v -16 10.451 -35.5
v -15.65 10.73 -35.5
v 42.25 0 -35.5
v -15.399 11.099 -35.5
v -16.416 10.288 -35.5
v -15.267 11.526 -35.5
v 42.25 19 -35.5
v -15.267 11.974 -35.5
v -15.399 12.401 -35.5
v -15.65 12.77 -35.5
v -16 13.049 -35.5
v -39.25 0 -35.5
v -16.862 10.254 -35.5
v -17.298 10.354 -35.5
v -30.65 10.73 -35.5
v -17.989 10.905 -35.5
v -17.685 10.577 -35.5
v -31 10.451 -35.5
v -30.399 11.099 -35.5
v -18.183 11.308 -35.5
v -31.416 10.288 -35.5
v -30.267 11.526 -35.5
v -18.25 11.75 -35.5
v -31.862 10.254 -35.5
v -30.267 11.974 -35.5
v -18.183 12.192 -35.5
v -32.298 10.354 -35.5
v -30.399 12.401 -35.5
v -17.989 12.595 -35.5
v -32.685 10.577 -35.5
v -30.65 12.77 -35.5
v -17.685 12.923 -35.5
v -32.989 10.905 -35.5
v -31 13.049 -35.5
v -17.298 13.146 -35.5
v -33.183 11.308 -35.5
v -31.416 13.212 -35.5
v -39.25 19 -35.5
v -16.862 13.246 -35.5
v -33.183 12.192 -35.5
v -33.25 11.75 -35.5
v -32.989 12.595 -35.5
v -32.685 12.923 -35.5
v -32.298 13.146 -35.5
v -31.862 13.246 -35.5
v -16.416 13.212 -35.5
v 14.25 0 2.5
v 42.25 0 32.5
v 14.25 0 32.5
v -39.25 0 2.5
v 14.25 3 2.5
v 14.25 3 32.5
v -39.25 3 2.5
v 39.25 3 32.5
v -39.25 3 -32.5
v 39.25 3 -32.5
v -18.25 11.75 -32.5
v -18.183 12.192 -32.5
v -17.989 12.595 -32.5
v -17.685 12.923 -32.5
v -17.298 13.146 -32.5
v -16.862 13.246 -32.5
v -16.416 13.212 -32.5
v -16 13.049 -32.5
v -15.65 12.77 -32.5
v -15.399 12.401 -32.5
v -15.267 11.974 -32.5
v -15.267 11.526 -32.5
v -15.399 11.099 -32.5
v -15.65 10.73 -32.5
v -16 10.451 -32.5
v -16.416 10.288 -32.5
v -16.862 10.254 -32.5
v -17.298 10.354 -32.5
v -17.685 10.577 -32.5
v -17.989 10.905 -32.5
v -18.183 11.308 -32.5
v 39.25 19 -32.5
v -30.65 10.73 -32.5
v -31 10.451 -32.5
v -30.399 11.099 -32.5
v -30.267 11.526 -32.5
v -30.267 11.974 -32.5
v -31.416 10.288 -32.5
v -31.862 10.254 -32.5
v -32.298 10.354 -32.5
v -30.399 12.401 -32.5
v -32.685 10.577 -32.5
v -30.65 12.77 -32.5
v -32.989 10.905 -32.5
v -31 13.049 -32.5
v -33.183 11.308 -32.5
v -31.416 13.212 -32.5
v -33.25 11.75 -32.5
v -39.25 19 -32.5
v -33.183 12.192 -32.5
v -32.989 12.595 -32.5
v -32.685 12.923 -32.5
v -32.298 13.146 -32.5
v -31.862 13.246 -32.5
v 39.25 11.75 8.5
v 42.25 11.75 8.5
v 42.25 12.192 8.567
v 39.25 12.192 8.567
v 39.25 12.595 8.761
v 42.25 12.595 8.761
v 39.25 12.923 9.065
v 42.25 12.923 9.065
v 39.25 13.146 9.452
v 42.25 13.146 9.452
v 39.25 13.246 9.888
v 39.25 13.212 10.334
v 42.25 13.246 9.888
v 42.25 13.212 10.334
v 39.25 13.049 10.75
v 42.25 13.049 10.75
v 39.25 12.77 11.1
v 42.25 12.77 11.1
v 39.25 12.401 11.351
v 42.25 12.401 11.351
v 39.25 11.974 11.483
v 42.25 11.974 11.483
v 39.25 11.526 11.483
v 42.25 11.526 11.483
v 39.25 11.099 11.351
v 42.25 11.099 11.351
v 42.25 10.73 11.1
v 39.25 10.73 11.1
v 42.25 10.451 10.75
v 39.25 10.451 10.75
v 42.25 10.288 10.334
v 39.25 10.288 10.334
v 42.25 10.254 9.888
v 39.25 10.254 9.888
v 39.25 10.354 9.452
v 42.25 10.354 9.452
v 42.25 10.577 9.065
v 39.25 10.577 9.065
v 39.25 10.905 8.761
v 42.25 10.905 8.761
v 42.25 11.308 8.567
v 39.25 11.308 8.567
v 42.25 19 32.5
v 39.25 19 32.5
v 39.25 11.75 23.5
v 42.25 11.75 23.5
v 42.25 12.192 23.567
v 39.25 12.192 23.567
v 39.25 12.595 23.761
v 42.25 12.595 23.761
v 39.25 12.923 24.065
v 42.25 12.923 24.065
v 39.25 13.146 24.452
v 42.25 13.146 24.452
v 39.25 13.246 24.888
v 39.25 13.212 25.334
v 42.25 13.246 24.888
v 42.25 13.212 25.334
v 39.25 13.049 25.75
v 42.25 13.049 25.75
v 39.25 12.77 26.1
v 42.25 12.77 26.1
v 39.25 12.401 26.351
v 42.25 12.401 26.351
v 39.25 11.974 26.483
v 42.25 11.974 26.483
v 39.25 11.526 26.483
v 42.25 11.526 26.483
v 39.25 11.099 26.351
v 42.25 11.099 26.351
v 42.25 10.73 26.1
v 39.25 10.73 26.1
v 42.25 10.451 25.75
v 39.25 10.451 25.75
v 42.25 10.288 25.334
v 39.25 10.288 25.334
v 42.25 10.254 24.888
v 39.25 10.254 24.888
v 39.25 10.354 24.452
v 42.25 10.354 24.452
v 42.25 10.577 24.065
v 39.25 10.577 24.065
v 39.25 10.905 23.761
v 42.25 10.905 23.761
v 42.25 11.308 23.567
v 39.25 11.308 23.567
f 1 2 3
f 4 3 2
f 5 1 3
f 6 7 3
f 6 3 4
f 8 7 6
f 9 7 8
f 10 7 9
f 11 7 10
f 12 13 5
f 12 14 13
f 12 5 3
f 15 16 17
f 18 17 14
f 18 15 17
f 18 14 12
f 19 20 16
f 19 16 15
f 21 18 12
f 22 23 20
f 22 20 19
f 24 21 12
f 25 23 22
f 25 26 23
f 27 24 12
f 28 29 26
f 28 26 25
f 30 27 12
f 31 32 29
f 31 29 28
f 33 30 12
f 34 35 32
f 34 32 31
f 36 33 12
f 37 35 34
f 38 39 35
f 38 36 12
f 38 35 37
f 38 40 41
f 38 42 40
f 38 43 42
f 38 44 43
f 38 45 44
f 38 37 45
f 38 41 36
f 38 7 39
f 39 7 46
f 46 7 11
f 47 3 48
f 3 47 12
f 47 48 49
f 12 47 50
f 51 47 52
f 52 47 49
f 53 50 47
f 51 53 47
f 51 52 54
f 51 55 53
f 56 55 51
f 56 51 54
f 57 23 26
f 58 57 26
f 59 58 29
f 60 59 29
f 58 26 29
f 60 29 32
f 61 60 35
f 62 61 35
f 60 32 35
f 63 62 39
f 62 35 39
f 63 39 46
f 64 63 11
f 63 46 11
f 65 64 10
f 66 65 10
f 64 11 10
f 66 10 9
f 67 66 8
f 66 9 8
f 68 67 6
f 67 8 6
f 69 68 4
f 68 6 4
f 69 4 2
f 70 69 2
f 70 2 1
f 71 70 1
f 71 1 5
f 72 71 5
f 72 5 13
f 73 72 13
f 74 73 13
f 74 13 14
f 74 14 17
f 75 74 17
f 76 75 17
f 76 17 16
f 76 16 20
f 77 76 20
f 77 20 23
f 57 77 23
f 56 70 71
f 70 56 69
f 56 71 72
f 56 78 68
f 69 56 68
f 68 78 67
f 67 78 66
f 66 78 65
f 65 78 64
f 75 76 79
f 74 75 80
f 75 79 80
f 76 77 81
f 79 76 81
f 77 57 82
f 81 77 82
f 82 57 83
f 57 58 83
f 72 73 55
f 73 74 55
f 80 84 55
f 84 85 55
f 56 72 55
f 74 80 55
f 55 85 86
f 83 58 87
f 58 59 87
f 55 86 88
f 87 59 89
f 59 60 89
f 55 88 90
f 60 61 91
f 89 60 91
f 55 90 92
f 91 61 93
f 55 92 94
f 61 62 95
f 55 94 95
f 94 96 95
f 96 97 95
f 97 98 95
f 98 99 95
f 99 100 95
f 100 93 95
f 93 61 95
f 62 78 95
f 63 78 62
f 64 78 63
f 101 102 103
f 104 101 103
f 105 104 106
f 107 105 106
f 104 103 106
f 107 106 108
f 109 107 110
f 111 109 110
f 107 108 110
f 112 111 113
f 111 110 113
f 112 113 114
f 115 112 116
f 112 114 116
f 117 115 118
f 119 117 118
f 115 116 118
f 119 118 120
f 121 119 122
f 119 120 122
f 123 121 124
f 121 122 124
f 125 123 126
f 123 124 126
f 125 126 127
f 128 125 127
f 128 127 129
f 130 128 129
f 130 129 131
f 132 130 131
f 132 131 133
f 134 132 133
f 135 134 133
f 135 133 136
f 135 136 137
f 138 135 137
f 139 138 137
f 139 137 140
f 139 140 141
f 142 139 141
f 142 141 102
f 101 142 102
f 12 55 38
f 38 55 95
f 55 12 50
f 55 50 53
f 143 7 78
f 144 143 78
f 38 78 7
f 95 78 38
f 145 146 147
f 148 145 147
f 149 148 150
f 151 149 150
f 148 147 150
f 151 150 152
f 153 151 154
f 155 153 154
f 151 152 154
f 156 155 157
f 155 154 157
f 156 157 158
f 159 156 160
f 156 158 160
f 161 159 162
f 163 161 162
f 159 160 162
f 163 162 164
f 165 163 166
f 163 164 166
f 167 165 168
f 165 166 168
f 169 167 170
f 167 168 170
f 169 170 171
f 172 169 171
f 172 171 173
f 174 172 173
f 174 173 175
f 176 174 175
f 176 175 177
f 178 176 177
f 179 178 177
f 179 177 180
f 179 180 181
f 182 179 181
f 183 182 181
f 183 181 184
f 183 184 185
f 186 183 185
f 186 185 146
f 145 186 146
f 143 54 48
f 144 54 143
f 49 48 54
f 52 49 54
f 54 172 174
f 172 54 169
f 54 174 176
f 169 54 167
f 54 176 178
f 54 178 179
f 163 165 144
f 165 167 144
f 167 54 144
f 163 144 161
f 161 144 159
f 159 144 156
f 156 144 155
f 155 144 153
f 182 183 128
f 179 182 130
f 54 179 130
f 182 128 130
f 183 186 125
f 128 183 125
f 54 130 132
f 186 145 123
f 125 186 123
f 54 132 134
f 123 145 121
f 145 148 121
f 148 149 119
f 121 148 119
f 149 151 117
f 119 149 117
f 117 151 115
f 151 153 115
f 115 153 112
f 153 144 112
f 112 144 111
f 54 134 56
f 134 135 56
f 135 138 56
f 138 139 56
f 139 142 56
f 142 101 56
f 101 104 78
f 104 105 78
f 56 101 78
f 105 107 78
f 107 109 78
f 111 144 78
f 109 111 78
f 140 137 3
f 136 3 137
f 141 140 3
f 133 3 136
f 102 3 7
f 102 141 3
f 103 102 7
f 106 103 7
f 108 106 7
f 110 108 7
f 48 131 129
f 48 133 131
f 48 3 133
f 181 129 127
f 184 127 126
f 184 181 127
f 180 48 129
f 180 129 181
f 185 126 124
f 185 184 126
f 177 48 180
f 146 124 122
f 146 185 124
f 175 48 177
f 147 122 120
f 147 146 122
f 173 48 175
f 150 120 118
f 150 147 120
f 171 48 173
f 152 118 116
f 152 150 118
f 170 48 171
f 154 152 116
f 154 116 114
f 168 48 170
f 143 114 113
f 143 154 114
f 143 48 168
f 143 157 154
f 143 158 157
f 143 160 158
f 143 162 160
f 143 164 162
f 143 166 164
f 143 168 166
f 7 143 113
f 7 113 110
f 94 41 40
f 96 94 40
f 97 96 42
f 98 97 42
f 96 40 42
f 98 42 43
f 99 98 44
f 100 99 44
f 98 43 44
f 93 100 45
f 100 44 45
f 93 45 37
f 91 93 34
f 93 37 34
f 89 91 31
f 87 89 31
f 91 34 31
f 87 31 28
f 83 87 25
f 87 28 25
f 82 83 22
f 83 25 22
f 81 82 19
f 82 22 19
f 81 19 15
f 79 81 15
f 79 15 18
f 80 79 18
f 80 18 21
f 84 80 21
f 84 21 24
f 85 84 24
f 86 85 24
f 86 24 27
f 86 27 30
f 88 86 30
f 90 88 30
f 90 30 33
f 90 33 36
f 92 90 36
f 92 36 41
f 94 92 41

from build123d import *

# Parameters (mm, degrees)
SALIENTE_EXTRUIR1_DEPTH = 3
CROQUIS2_W              = 65
CROQUIS2_H              = 19
SALIENTE_EXTRUIR2_DEPTH = 3
CROQUIS3_W              = 81.5
CROQUIS3_H              = 19
SALIENTE_EXTRUIR3_DEPTH = 3
CROQUIS4_R              = 1.5
CORTAR_EXTRUIR1_DEPTH   = 69
CROQUIS5_R              = 1.5
CORTAR_EXTRUIR2_DEPTH   = 82.5


with BuildPart() as part:
    # Croquis1 → Saliente-Extruir1 (new body)
    with BuildSketch(Plane(origin=(0, 0, 0), x_dir=(1, 0, 0), z_dir=(0, 1, 0))):
        Polygon((-39.25, -2.5), (14.25, -2.5), (14.25, -32.5), (39.25, -32.5), (39.25, 32.5), (-39.25, 32.5), align=None)
    extrude(amount=SALIENTE_EXTRUIR1_DEPTH)

    # Croquis2 → Saliente-Extruir2 (add)
    with BuildSketch(Plane(origin=(39.25, 0, 0), x_dir=(0, 0, -1), z_dir=(1, 0, 0))):
        with Locations((0, 9.5)):
            Rectangle(CROQUIS2_W, CROQUIS2_H)
    extrude(amount=SALIENTE_EXTRUIR2_DEPTH)

    # Croquis3 → Saliente-Extruir3 (add)
    with BuildSketch(Plane(origin=(0, 0, -32.5), x_dir=(-1, 0, 0), z_dir=(0, 0, -1))):
        with Locations((-1.5, 9.5)):
            Rectangle(CROQUIS3_W, CROQUIS3_H)
    extrude(amount=SALIENTE_EXTRUIR3_DEPTH)

    # Croquis4 → Cortar-Extruir1 (cut, through all)
    with BuildSketch(Plane(origin=(0, 0, -35.5), x_dir=(-1, 0, 0), z_dir=(0, 0, -1))):
        with Locations((31.75, 11.75)):
            Circle(CROQUIS4_R)
        with Locations((16.75, 11.75)):
            Circle(CROQUIS4_R)
    extrude(amount=-CORTAR_EXTRUIR1_DEPTH, mode=Mode.SUBTRACT)

    # Croquis5 → Cortar-Extruir2 (cut, through all)
    with BuildSketch(Plane(origin=(42.25, 0, 0), x_dir=(0, 0, -1), z_dir=(1, 0, 0))):
        with Locations((-25, 11.75)):
            Circle(CROQUIS5_R)
        with Locations((-10, 11.75)):
            Circle(CROQUIS5_R)
    extrude(amount=-CORTAR_EXTRUIR2_DEPTH, mode=Mode.SUBTRACT)


solid = part.part
